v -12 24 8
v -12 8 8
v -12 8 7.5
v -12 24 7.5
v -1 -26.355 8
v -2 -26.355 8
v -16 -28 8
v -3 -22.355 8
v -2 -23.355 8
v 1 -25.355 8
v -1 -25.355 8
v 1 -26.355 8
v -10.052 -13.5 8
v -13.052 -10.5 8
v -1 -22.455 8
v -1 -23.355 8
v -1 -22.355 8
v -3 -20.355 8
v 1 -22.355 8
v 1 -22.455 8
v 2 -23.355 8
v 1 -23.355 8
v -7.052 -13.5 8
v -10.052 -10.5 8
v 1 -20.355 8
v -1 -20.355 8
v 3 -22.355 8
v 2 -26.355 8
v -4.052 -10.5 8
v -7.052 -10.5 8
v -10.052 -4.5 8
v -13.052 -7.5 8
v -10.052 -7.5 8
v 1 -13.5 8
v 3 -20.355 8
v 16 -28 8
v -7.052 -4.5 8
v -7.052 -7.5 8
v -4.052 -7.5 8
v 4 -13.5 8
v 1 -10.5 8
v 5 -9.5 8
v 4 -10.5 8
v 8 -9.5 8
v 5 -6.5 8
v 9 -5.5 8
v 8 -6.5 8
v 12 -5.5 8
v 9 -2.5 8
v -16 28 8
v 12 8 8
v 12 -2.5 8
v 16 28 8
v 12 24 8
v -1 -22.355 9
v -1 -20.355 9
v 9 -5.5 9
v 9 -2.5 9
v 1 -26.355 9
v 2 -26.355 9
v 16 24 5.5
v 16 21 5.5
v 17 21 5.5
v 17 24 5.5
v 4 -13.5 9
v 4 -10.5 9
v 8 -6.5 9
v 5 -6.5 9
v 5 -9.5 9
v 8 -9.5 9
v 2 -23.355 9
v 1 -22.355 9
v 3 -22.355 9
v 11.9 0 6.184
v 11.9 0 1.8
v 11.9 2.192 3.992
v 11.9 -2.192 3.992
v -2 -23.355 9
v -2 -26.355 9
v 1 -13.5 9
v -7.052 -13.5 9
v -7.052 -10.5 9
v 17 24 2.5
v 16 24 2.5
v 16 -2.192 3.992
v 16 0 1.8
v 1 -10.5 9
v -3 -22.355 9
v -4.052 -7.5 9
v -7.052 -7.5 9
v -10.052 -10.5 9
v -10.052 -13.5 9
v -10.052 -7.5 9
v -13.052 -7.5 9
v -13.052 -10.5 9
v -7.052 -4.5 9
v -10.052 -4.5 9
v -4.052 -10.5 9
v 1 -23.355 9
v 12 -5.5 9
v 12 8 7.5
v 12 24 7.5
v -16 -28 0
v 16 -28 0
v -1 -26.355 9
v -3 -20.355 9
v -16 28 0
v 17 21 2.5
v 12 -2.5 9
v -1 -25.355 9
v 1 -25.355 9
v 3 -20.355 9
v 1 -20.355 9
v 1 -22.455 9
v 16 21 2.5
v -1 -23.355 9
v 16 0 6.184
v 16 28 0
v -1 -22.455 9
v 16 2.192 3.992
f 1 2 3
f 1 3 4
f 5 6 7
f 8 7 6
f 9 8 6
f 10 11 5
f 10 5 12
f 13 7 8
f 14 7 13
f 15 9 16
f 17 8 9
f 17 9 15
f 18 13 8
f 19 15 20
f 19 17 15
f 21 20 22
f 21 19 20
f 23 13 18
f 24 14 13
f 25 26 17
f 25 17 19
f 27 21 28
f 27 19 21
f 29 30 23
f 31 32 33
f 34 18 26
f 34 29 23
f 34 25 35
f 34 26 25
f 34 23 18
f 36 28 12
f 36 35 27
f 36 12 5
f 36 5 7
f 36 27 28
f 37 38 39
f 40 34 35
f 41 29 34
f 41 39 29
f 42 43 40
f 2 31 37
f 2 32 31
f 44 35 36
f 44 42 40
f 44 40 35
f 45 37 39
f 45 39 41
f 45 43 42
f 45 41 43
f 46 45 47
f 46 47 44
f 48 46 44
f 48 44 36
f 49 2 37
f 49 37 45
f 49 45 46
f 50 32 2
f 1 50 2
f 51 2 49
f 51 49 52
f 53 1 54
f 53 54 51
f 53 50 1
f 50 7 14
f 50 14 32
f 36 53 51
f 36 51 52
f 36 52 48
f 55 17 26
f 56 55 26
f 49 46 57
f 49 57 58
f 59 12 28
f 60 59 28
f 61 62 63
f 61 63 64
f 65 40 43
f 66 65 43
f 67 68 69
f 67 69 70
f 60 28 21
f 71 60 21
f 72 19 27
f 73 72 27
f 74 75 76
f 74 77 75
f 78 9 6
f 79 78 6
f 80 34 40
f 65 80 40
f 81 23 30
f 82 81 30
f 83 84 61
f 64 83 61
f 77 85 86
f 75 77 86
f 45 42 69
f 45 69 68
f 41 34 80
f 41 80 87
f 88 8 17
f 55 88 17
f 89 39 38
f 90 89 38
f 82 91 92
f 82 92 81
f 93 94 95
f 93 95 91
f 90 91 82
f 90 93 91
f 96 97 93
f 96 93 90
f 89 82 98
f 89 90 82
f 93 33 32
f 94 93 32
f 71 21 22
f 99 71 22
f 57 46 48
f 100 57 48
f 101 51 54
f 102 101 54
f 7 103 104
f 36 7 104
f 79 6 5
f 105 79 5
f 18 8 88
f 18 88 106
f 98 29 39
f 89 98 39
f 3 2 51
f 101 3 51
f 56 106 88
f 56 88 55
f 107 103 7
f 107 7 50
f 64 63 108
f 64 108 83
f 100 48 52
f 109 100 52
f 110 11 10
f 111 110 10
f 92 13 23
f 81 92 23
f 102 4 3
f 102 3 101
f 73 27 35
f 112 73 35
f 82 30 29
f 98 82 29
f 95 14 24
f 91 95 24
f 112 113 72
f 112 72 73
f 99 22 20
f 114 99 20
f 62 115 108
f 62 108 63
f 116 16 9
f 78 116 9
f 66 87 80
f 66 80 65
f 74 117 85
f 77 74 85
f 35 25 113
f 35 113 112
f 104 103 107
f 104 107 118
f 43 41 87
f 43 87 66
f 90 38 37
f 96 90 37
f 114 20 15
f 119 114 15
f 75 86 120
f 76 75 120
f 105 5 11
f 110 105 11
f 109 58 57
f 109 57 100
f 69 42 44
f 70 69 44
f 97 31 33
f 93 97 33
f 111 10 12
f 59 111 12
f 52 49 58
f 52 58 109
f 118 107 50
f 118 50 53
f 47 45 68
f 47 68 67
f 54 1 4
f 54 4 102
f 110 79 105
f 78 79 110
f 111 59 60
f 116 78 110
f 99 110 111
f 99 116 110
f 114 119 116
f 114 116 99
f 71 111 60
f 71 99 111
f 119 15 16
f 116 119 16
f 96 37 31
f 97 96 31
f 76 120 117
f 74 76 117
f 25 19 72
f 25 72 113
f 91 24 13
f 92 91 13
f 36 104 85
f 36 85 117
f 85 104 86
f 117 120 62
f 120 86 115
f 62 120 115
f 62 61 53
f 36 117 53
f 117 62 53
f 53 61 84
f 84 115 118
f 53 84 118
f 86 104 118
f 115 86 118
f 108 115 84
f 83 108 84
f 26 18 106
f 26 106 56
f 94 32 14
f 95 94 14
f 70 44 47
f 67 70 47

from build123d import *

# Parameters (mm, degrees)
F0_W     = 32
F0_H     = 56
F1_DEPTH = 8
F2_W     = 3
F2_H     = 3
F3_DEPTH = 1
F4_W     = 24
F4_H     = 16
F5_DEPTH = 0.5
F4_W_2   = 3
F4_H_2   = 3
F4_W_3   = 2
F4_H_3   = 2
F6_DEPTH = 1
F8_DEPTH = 4.1


with BuildPart() as f1:
    # F0 (on Top) → F1 (new body)
    with BuildSketch(Plane.XY):
        Rectangle(F0_W, F0_H)
    extrude(amount=F1_DEPTH)

    # F2 (on face) → F3 (join)
    with BuildSketch(Plane.YZ.offset(16)):
        with Locations((22.5, 4)):
            Rectangle(F2_W, F2_H)
    extrude(amount=F3_DEPTH)

    # F4 (on face) → F5 (cut)
    with BuildSketch(Plane.XY.offset(8)):
        with Locations((0, 16)):
            Rectangle(F4_W, F4_H)
    extrude(amount=-F5_DEPTH, mode=Mode.SUBTRACT)

    # F4 (on face) → F6 (join)
    with BuildSketch(Plane.XY.offset(8)):
        Polygon((-10.052171, -7.5), (-13.052171, -7.5), (-13.052171, -10.5), (-10.052171, -10.5), (-10.052171, -13.5), (-7.052171, -13.5), (-7.052171, -10.5), (-4.052171, -10.5), (-4.052171, -7.5), (-7.052171, -7.5), (-7.052171, -4.5), (-10.052171, -4.5), align=None)
        with Locations((2.5, -12)):
            Rectangle(F4_W_2, F4_H_2)
        with Locations((6.5, -8)):
            Rectangle(F4_W_2, F4_H_2)
        with Locations((10.5, -4)):
            Rectangle(F4_W_2, F4_H_2)
        with Locations((-2, -21.35515)):
            Rectangle(F4_W_3, F4_H_3)
        with Locations((2, -21.35515)):
            Rectangle(F4_W_3, F4_H_3)
        Polygon((-1, -23.35515), (-2, -23.35515), (-2, -26.35515), (-1, -26.35515), (-1, -25.35515), (0, -25.35515), (1, -25.35515), (1, -26.35515), (2, -26.35515), (2, -23.35515), (1, -23.35515), (1, -22.45515), (-1, -22.45515), align=None)
    extrude(amount=F6_DEPTH)

    # F7 (on face) → F8 (cut)
    with BuildSketch(Plane.YZ.offset(16)):
        Polygon((0, 1.8), (2.192031, 3.992031), (0, 6.184062), (-2.192031, 3.992031), align=None)
    extrude(amount=-F8_DEPTH, mode=Mode.SUBTRACT)


solid = f1.part
